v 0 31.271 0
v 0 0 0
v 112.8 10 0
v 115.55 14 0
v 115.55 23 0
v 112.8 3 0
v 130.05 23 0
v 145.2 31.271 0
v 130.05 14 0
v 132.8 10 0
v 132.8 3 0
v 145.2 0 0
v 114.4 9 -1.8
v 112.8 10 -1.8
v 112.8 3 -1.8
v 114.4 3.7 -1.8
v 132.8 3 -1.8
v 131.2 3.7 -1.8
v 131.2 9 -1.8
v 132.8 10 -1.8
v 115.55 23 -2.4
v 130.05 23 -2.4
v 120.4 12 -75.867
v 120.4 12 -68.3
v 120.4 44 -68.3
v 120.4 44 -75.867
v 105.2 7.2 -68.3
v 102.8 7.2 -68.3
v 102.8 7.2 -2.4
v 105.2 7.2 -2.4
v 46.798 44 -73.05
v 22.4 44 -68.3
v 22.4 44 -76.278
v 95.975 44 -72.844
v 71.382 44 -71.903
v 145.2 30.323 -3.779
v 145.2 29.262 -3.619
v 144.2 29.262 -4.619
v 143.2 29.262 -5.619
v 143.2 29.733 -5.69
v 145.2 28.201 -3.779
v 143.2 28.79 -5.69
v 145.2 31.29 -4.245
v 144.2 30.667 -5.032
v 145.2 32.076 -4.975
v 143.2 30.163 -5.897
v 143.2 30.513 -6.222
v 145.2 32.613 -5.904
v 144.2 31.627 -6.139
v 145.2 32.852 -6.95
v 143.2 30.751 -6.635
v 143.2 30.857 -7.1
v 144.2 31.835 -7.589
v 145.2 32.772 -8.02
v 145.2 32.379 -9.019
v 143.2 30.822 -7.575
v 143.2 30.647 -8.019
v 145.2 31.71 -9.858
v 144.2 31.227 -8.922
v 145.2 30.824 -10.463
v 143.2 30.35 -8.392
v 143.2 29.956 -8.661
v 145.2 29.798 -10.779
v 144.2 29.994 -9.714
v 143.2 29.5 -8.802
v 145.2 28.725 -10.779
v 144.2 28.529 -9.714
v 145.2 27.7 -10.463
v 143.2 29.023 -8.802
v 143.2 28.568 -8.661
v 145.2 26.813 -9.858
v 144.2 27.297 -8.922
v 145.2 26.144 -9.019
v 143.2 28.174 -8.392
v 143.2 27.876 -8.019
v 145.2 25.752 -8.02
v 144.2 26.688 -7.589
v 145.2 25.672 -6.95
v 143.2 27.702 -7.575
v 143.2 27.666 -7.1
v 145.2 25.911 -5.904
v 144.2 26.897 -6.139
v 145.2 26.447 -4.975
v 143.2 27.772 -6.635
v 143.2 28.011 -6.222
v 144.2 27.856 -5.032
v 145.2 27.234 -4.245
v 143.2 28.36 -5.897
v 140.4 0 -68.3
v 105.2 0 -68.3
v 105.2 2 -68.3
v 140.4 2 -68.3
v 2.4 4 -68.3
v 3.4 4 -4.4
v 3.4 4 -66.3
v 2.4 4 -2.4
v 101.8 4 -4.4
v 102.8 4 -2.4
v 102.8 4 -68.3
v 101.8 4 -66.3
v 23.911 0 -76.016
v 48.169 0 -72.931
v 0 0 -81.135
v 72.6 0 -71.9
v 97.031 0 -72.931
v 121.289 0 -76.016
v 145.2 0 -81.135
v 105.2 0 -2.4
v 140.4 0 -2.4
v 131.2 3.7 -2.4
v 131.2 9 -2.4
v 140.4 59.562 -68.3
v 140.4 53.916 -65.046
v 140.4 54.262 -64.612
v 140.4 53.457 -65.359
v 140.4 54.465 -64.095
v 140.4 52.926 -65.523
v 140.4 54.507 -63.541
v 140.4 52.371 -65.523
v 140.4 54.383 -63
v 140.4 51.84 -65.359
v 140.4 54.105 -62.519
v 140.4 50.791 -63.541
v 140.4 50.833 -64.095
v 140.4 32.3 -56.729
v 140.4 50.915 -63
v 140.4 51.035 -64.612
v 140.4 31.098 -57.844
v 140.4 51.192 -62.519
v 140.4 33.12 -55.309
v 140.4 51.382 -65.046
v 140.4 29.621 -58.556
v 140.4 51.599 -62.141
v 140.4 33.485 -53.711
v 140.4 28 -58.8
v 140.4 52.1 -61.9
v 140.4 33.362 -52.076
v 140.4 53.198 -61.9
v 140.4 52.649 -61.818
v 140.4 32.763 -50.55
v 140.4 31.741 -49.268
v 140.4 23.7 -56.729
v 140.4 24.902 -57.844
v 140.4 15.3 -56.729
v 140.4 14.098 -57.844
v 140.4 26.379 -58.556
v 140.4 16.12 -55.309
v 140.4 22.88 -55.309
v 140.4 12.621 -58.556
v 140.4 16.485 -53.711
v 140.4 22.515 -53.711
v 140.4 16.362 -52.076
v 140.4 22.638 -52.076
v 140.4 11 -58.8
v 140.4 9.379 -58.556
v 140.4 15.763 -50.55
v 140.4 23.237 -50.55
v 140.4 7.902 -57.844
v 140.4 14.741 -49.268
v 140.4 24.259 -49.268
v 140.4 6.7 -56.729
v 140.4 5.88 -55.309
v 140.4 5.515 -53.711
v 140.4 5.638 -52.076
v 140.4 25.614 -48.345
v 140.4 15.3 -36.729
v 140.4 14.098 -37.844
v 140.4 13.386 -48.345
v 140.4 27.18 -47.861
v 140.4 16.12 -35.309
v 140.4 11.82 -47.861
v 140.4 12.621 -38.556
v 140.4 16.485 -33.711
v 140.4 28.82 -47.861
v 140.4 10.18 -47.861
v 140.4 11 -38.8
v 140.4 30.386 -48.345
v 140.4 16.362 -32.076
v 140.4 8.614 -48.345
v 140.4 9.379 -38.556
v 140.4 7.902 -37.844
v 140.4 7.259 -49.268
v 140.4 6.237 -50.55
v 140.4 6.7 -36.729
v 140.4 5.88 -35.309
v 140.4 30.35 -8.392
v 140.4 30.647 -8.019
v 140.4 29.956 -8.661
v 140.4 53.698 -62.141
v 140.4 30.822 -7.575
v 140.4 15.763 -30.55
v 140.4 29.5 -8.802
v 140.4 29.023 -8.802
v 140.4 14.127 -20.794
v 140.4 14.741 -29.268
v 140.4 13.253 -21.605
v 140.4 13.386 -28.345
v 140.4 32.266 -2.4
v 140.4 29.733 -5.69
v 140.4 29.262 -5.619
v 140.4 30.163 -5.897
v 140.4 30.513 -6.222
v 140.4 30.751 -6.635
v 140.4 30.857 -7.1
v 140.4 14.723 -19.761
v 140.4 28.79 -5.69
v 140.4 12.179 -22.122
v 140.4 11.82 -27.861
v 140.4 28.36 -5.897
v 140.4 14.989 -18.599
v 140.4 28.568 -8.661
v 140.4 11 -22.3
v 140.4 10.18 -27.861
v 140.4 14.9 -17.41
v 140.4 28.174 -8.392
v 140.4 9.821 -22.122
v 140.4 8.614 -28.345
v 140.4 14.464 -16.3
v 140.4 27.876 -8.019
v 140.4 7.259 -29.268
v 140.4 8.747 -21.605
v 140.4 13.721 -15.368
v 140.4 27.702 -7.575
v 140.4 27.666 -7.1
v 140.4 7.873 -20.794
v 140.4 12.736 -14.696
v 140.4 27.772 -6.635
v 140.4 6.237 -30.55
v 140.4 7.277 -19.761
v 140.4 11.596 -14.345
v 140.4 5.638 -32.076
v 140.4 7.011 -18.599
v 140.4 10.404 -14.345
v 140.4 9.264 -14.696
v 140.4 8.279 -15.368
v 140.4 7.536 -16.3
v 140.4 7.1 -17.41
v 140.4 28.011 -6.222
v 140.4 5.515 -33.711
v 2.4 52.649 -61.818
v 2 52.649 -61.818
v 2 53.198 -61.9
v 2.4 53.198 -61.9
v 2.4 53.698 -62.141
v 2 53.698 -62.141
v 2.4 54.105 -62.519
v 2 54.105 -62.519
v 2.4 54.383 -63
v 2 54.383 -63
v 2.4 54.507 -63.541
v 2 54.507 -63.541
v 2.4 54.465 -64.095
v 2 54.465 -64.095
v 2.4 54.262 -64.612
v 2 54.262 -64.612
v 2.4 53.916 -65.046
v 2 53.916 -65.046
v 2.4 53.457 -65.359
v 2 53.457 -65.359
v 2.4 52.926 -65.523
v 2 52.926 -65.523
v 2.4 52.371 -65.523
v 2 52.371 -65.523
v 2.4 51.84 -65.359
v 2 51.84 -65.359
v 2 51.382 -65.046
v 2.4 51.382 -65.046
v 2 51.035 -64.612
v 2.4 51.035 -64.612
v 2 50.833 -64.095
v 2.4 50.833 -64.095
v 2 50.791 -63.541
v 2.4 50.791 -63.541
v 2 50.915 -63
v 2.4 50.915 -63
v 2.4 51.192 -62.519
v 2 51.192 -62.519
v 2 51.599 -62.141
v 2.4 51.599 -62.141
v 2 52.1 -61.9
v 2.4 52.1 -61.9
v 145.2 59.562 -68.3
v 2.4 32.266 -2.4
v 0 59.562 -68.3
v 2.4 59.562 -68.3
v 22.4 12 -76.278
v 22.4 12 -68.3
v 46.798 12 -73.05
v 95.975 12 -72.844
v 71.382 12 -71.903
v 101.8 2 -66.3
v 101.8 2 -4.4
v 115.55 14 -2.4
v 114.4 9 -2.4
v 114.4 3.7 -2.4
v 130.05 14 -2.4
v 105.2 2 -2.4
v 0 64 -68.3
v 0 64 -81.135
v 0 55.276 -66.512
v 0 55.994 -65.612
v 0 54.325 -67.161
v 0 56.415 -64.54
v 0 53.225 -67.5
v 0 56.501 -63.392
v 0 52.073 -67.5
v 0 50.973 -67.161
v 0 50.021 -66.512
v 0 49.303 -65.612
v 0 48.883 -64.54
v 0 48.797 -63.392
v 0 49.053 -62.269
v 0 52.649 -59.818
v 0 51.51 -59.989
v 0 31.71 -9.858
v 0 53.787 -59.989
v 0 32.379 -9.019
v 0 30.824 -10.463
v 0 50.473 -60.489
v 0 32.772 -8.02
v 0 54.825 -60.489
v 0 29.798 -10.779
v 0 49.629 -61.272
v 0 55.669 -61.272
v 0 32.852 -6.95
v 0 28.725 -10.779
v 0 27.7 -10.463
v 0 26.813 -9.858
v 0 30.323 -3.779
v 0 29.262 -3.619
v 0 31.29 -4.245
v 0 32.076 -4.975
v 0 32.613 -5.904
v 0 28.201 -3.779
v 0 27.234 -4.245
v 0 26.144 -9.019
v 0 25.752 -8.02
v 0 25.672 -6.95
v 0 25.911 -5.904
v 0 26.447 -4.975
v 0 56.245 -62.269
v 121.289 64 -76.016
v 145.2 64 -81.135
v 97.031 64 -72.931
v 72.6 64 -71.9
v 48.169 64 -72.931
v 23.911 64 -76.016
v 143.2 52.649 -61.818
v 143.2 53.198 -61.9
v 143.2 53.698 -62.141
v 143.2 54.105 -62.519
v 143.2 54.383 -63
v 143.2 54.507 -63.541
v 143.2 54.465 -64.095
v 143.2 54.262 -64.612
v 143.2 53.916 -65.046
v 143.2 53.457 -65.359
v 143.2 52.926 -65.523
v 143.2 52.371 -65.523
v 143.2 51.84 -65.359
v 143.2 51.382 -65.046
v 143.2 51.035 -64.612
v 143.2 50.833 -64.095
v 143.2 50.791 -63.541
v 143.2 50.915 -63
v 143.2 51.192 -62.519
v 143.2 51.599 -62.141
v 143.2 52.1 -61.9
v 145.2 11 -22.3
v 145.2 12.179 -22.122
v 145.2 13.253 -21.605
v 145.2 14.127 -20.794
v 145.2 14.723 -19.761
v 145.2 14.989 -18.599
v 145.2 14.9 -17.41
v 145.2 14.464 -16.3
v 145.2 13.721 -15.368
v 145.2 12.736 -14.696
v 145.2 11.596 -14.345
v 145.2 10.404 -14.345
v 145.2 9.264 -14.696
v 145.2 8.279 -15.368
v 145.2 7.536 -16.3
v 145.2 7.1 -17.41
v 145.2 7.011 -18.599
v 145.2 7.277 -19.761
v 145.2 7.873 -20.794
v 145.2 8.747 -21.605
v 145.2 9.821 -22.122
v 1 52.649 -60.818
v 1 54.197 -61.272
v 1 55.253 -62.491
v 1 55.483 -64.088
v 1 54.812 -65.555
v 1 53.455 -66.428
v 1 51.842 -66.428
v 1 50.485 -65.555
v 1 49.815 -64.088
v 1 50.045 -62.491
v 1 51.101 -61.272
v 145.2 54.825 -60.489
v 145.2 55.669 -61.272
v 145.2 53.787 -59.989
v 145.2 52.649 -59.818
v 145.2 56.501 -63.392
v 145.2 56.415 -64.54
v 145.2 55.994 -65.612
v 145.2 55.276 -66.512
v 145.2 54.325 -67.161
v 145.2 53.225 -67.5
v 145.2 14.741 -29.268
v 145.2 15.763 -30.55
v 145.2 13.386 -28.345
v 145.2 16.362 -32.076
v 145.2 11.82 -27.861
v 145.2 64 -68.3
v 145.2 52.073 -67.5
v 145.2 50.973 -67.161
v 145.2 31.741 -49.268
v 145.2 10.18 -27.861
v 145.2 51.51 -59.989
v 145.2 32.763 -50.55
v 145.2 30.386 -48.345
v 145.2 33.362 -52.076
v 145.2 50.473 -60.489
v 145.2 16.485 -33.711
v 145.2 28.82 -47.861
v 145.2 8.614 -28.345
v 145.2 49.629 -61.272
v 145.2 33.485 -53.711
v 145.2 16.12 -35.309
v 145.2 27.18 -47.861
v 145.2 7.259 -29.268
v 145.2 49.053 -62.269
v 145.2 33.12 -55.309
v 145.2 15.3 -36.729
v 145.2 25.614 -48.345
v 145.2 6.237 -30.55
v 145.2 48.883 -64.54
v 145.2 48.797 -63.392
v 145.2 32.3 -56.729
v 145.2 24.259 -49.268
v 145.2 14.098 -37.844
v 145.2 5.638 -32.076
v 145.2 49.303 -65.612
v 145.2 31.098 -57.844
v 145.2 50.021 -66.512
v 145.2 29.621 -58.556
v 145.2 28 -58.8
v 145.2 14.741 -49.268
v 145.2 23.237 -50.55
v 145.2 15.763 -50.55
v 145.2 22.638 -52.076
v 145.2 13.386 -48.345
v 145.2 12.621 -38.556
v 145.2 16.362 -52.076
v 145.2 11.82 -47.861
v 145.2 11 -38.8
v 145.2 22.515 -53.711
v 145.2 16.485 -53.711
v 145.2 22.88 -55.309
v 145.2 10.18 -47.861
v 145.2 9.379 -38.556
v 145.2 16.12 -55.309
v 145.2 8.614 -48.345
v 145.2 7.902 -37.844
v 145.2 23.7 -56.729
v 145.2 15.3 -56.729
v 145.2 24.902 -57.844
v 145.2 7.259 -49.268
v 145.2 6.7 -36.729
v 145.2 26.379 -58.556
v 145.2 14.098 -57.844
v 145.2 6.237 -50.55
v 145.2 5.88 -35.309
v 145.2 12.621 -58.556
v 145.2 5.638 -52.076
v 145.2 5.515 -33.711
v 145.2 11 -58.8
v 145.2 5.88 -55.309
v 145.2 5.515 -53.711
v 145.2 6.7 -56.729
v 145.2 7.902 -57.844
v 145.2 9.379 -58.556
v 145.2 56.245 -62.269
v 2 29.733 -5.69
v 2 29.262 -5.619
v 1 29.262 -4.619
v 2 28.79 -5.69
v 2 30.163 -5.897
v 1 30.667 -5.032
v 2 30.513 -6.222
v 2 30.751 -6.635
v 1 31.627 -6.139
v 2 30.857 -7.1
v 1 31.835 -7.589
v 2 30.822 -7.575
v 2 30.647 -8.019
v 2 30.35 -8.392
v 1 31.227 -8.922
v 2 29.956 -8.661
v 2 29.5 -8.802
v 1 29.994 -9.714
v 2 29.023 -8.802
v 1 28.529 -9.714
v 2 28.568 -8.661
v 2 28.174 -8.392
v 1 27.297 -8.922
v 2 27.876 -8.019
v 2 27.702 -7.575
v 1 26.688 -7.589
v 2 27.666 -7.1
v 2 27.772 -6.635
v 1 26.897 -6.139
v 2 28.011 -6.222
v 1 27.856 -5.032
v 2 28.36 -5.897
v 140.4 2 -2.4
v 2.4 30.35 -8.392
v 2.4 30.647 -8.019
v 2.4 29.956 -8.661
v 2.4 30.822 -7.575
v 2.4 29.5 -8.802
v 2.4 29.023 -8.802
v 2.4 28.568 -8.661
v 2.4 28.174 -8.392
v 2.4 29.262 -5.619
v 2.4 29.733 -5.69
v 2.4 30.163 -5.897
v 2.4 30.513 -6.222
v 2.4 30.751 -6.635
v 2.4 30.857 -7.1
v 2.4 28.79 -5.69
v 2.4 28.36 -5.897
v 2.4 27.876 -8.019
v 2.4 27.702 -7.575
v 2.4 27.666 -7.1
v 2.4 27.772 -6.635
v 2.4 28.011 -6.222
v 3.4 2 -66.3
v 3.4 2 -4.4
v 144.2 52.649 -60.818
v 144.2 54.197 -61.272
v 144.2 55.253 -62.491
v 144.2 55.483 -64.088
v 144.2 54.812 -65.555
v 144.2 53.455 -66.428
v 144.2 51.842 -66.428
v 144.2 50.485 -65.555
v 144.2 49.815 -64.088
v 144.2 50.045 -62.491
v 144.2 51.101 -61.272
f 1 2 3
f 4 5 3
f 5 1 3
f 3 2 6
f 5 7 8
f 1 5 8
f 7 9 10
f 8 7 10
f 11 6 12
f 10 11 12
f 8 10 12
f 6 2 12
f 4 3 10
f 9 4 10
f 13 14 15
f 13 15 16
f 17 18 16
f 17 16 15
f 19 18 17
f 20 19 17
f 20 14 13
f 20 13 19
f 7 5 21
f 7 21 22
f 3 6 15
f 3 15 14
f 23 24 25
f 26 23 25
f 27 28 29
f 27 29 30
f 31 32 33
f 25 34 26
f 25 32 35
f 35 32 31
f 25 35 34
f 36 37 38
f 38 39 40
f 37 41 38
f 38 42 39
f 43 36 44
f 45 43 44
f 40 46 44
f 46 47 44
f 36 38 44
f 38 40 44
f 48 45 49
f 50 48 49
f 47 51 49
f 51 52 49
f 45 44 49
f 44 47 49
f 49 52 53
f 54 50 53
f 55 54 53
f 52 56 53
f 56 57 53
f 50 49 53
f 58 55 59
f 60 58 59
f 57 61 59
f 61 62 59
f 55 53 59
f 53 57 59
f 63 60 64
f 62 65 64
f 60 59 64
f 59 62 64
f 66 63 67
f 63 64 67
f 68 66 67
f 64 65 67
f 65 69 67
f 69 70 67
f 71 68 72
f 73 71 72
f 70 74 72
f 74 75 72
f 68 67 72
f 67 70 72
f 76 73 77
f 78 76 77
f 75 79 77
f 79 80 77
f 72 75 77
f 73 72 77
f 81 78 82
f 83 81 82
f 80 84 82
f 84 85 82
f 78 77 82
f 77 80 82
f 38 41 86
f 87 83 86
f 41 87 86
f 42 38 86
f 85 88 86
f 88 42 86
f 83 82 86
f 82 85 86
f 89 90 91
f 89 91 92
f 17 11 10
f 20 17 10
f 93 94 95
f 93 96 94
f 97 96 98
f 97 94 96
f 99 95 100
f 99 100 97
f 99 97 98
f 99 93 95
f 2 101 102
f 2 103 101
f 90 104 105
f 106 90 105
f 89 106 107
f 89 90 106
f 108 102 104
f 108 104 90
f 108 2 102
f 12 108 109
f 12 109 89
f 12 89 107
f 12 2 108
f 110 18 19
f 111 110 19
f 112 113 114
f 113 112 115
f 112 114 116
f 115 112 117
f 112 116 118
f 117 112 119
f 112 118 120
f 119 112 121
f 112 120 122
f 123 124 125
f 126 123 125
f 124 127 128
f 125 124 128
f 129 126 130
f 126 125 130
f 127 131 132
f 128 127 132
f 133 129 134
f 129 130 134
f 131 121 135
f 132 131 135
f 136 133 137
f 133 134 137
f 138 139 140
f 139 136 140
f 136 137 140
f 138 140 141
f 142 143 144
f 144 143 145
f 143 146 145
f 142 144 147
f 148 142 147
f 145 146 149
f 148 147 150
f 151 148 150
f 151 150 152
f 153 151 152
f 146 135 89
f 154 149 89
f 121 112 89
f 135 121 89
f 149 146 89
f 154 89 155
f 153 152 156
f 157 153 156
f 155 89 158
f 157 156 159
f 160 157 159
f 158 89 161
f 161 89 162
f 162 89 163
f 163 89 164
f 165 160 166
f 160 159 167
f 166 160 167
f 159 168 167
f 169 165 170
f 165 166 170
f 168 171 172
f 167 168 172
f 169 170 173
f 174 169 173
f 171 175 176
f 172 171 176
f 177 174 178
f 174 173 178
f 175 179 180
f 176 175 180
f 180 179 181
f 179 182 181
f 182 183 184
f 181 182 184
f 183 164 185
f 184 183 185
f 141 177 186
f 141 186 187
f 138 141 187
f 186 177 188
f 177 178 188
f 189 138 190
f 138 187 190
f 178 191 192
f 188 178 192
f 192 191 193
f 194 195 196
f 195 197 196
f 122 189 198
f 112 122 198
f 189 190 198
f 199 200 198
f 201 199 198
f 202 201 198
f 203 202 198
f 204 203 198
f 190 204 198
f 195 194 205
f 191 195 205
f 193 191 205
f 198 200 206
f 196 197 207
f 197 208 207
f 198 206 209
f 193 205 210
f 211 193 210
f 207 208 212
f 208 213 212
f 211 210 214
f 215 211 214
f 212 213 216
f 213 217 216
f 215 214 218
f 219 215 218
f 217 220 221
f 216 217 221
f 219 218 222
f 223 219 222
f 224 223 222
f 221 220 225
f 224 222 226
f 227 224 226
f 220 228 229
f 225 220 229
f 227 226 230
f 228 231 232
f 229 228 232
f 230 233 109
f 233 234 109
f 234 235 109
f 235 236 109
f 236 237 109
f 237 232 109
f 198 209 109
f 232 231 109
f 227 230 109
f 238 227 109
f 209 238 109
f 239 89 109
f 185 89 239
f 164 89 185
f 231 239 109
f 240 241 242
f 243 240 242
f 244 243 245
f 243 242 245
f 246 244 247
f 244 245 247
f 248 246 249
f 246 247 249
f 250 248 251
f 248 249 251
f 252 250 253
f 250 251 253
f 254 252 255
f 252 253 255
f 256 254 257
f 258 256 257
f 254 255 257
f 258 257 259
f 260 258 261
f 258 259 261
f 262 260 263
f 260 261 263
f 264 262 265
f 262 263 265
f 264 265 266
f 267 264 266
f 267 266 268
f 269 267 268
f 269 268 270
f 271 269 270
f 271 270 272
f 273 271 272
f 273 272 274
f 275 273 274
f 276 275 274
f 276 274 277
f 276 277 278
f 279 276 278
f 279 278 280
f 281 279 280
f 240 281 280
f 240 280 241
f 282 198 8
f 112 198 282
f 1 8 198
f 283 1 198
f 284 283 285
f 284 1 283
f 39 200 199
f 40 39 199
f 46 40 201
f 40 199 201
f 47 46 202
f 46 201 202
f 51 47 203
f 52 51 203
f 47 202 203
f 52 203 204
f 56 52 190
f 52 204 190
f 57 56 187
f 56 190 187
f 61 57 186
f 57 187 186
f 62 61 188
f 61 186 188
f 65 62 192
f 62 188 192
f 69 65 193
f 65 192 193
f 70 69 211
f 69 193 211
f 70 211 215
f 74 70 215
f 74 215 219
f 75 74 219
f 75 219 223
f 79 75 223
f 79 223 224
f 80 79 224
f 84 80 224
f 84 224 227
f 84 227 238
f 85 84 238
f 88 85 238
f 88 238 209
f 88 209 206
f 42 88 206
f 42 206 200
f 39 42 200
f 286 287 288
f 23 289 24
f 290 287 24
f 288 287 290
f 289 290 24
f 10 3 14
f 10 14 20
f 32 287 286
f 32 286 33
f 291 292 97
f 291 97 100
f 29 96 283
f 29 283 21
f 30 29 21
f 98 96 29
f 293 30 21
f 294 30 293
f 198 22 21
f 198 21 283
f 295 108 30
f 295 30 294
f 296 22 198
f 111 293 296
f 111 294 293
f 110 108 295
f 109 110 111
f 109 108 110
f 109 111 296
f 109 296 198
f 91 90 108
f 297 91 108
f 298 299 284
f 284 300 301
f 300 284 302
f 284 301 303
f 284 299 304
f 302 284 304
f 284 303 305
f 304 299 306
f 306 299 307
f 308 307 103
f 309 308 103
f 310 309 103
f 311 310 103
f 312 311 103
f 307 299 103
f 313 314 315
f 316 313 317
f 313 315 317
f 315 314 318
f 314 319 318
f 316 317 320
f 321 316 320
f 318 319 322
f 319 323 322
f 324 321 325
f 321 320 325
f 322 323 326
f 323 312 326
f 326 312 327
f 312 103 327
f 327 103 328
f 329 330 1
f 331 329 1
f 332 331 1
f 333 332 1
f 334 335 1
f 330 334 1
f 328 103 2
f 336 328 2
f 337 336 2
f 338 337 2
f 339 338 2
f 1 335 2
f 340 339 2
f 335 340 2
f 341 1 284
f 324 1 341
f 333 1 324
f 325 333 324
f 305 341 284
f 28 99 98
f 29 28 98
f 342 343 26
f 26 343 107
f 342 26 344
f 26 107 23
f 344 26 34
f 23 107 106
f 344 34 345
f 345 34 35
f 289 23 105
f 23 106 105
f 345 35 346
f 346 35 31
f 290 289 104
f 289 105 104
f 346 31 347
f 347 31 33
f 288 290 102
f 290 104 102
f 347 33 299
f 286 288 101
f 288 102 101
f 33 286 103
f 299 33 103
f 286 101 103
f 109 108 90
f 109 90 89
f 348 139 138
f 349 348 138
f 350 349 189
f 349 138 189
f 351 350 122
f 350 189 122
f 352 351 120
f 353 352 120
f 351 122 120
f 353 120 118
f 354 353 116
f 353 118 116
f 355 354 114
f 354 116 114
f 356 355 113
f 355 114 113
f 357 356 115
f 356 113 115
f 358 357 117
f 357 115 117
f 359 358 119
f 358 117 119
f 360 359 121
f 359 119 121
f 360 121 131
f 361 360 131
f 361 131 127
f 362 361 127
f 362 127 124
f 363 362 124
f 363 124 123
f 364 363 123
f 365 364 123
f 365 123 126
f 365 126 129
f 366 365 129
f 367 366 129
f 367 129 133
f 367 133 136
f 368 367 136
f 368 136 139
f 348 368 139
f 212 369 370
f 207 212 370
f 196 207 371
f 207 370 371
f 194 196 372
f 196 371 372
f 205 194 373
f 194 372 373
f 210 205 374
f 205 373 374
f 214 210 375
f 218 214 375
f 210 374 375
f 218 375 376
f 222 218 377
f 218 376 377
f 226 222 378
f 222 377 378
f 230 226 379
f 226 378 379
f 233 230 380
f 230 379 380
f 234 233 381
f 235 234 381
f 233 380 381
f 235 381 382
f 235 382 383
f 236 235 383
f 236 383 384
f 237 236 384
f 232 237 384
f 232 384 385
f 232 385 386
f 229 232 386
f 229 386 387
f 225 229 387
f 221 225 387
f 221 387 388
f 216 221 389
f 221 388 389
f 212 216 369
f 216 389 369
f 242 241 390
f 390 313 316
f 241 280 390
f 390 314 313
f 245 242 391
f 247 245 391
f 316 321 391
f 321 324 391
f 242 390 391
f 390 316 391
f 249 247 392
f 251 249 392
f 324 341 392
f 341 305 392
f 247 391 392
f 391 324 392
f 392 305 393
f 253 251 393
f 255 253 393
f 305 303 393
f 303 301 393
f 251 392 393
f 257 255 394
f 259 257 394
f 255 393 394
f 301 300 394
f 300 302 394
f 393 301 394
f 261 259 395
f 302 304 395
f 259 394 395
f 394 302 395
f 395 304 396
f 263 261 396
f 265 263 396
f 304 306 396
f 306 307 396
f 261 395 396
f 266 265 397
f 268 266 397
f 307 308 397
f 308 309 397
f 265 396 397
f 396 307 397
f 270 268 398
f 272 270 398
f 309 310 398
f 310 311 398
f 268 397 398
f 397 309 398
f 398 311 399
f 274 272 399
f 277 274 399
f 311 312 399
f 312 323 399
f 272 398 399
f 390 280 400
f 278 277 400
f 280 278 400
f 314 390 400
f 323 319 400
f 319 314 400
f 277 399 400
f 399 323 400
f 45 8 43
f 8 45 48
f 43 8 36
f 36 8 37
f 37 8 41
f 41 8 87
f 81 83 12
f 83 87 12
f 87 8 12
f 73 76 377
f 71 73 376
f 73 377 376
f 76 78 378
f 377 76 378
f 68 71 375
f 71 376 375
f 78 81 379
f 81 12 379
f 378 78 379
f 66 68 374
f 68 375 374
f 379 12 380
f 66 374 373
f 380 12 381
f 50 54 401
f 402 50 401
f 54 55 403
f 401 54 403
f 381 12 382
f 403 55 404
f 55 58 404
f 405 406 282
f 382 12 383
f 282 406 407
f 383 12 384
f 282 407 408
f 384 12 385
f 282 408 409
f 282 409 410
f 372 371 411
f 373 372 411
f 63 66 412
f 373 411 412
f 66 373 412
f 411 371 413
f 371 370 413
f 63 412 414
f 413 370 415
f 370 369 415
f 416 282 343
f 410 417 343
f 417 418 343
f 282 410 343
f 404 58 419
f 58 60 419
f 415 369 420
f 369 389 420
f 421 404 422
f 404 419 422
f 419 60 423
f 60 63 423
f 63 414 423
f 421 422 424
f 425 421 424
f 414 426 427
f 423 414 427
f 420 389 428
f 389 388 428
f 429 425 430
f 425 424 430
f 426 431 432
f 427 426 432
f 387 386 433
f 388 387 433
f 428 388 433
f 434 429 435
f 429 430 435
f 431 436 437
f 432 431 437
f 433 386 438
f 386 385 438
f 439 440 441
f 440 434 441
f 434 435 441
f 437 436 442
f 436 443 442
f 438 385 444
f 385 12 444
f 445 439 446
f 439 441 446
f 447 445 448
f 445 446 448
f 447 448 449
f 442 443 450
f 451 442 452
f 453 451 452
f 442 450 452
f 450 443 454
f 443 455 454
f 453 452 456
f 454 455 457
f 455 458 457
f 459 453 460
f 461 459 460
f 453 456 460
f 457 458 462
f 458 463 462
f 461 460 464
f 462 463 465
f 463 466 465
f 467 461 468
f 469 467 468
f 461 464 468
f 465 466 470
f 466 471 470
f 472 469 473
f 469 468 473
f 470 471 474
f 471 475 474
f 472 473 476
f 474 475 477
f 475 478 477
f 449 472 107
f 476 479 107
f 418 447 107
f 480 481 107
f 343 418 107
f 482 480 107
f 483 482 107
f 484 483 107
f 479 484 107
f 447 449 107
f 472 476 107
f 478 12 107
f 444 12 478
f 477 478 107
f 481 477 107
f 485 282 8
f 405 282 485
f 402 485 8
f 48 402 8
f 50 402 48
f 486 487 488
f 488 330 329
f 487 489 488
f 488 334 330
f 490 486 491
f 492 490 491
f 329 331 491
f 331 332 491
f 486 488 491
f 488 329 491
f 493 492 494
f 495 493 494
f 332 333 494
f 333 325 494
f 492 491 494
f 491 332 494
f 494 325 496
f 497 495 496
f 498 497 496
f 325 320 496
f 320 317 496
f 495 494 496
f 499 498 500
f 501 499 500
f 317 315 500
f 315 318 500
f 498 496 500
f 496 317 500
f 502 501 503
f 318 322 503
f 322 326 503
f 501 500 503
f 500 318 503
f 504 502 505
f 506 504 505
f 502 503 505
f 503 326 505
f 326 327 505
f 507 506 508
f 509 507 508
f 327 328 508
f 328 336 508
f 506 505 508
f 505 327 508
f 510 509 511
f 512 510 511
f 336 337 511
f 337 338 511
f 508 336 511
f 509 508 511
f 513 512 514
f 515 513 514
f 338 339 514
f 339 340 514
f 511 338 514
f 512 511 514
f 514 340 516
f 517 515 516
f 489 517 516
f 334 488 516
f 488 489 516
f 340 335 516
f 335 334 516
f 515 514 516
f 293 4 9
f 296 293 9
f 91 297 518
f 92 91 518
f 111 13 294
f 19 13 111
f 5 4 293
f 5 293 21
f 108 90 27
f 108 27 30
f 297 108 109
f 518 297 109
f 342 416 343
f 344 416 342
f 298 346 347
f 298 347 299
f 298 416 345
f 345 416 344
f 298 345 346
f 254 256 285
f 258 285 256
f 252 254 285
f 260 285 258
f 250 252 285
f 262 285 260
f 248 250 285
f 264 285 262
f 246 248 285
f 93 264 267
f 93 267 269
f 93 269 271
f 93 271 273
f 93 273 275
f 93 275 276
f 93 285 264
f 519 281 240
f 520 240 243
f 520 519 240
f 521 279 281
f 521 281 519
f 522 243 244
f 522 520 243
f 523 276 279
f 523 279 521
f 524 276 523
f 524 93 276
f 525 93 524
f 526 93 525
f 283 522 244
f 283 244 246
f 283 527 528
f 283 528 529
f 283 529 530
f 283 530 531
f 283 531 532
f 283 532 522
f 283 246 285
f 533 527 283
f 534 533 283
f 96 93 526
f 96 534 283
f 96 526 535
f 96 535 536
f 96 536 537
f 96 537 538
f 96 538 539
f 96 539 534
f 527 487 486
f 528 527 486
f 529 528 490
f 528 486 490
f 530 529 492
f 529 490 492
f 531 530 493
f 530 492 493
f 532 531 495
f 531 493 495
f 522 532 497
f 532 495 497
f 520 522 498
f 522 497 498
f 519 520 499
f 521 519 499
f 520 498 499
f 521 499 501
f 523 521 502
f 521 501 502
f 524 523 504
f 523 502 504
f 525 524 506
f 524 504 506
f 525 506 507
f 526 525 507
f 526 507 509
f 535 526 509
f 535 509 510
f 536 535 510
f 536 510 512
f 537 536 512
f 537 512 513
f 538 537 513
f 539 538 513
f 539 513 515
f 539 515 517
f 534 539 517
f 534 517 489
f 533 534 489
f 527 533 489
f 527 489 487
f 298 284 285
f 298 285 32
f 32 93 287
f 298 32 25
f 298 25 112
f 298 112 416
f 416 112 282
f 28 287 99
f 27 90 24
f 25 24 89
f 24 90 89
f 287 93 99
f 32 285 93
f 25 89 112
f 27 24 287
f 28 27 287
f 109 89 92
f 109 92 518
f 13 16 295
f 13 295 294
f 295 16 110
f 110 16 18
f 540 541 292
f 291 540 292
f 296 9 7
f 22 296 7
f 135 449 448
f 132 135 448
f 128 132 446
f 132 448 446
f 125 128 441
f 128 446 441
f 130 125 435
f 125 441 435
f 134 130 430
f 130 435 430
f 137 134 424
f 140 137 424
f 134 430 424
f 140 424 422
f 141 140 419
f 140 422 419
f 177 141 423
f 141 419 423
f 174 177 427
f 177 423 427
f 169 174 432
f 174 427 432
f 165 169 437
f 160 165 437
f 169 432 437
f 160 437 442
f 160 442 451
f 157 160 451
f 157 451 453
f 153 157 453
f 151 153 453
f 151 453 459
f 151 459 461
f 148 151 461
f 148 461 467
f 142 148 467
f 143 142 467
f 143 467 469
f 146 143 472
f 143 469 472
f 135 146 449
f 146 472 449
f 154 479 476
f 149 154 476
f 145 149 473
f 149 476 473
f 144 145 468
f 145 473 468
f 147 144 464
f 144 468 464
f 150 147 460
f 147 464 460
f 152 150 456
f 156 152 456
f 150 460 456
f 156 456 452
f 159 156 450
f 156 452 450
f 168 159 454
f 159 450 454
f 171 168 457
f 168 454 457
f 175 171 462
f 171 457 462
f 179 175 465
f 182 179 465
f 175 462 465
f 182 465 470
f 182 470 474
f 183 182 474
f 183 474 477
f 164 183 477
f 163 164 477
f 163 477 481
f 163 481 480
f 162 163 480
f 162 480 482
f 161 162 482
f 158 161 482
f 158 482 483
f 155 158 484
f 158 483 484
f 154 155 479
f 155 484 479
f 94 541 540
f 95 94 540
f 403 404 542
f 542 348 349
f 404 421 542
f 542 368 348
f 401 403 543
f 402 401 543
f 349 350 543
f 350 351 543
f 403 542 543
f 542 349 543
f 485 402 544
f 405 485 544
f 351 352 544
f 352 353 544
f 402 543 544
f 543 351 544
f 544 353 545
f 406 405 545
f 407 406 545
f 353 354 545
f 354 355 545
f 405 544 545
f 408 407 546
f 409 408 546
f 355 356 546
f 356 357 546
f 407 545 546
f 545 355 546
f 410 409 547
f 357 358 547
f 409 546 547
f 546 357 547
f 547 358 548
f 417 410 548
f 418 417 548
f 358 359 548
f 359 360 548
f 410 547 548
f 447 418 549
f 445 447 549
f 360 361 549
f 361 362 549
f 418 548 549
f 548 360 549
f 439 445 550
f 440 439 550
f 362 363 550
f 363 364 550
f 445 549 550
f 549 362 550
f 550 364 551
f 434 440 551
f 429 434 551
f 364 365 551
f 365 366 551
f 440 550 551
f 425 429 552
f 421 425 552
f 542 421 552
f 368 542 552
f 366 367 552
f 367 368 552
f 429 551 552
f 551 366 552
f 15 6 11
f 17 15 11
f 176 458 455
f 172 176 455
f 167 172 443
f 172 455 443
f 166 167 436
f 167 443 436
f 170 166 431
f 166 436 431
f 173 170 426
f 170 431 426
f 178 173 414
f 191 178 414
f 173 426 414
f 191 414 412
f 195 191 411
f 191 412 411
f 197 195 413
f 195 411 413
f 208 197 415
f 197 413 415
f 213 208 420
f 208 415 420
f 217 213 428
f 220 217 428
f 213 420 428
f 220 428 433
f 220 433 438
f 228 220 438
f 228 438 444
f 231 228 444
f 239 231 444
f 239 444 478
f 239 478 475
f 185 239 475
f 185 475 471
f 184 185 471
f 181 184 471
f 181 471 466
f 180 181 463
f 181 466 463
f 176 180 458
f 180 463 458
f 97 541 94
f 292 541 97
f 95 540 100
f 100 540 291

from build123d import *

# Parameters (mm, degrees)
SKIZZE1_W                         = 145.2
SKIZZE1_H                         = 70.7
AUFSATZ_LINEAR_AUSTRAGEN1_DEPTH   = 64
AUFSATZ_LINEAR_AUSTRAGEN2_DEPTH   = 64
SKIZZE4_W                         = 100.4
SKIZZE4_H                         = 65.9
SKIZZE4_W_2                       = 35.2
SCHNITT_LINEAR_AUSTRAGEN3_DEPTH   = 179.21855852
SKIZZE5_W                         = 100.4
SKIZZE5_H                         = 65.9
AUFSATZ_LINEAR_AUSTRAGEN3_DEPTH   = 2
SKIZZE5_W_2                       = 35.2
AUFSATZ_LINEAR_AUSTRAGEN3_2_DEPTH = 2
SKIZZE6_W                         = 100.4
SKIZZE6_H                         = 65.9
SKIZZE6_W_2                       = 98.4
SKIZZE6_H_2                       = 61.9
AUFSATZ_LINEAR_AUSTRAGEN4_DEPTH   = 2
SKIZZE8_W                         = 2.4
SKIZZE8_H                         = 65.9
SCHNITT_LINEAR_AUSTRAGEN4_DEPTH   = 56.8
SCHNITT_LINEAR_AUSTRAGEN5_DEPTH   = 179.21855852
SCHNITT_LINEAR_AUSTRAGEN6_DEPTH   = 179.21855852
SKIZZE11_W                        = 98
SKIZZE11_H                        = 32
SCHNITT_LINEAR_AUSTRAGEN7_DEPTH   = 173.753957986
SKIZZE12_R                        = 1.862936884
SKIZZE12_R_2                      = 1.6
SCHNITT_LINEAR_AUSTRAGEN8_DEPTH   = 179.21855852
FASE1_SIZE                        = 2
SKIZZE13_R                        = 5.5
SKIZZE13_R_2                      = 4
SCHNITT_LINEAR_AUSTRAGEN9_DEPTH   = 4.8
SKIZZE14_W                        = 20
SKIZZE14_H                        = 7
SCHNITT_LINEAR_AUSTRAGEN10_DEPTH  = 1.8
SKIZZE15_W                        = 16.8
SKIZZE15_H                        = 5.3
SCHNITT_LINEAR_AUSTRAGEN11_DEPTH  = 0.6
SKIZZE16_W                        = 14.5
SKIZZE16_H                        = 9
SCHNITT_LINEAR_AUSTRAGEN12_DEPTH  = 2.4


with BuildPart() as part:
    # Skizze1 → Aufsatz-Linear austragen1 (new body)
    with BuildSketch(Plane(origin=(0, 0, 0), x_dir=(1, 0, 0), z_dir=(0, 1, 0))):
        with Locations((72.6, 35.35)):
            Rectangle(SKIZZE1_W, SKIZZE1_H)
    extrude(amount=AUFSATZ_LINEAR_AUSTRAGEN1_DEPTH)

    # Skizze3 → Aufsatz-Linear austragen2 (add)
    with BuildSketch(Plane.XZ):
        with BuildLine():
            Line((0, -70.7), (145.2, -70.7))
            Line((145.2, -70.7), (145.2, -81.134546285))
            ThreePointArc((145.2, -81.134546285), (72.6, -71.9), (0, -81.134546285))
            Line((0, -81.134546285), (0, -70.7))
        make_face()
    extrude(amount=-AUFSATZ_LINEAR_AUSTRAGEN2_DEPTH)

    # Skizze4 → Schnitt-Linear austragen3 (cut, through all)
    with BuildSketch(Plane.XZ):
        with Locations((52.6, -35.35)):
            Rectangle(SKIZZE4_W, SKIZZE4_H)
        with Locations((122.8, -35.35)):
            Rectangle(SKIZZE4_W_2, SKIZZE4_H)
    extrude(amount=-SCHNITT_LINEAR_AUSTRAGEN3_DEPTH, mode=Mode.SUBTRACT)



with BuildPart() as body_2:
    # Skizze5 → Aufsatz-Linear austragen3 (new body)
    with BuildSketch(Plane.XZ):
        with Locations((52.6, -35.35)):
            Rectangle(SKIZZE5_W, SKIZZE5_H)
    extrude(amount=-AUFSATZ_LINEAR_AUSTRAGEN3_DEPTH)


with BuildPart() as body_3:
    # Skizze5 → Aufsatz-Linear austragen3 2 (new body)
    with BuildSketch(Plane.XZ):
        with Locations((122.8, -35.35)):
            Rectangle(SKIZZE5_W_2, SKIZZE5_H)
    extrude(amount=-AUFSATZ_LINEAR_AUSTRAGEN3_2_DEPTH)


with BuildPart() as part_1:
    add(part.part)

    add(body_2.part)  # Aufsatz-Linear austragen4 merges body 2
    # Skizze6 → Aufsatz-Linear austragen4 (add)
    with BuildSketch(Plane(origin=(0, 2, 0), x_dir=(1, 0, 0), z_dir=(0, 1, 0))):
        with Locations((52.6, 35.35)):
            Rectangle(SKIZZE6_W, SKIZZE6_H)
        with Locations((52.6, 35.35)):
            Rectangle(SKIZZE6_W_2, SKIZZE6_H_2, mode=Mode.SUBTRACT)
    extrude(amount=AUFSATZ_LINEAR_AUSTRAGEN4_DEPTH)

    # Skizze8 → Schnitt-Linear austragen4 (cut)
    with BuildSketch(Plane(origin=(0, 64, 0), x_dir=(1, 0, 0), z_dir=(0, 1, 0))):
        with Locations((104, 35.35)):
            Rectangle(SKIZZE8_W, SKIZZE8_H)
    extrude(amount=-SCHNITT_LINEAR_AUSTRAGEN4_DEPTH, mode=Mode.SUBTRACT)

    # Skizze9 → Schnitt-Linear austragen5 (cut, through all)
    with BuildSketch(Plane.ZY):
        Polygon((-68.3, 64), (0, 64), (0, 35.70921369), align=None)
    extrude(amount=-SCHNITT_LINEAR_AUSTRAGEN5_DEPTH, mode=Mode.SUBTRACT)

    # Skizze10 → Schnitt-Linear austragen6 (cut, through all)
    with BuildSketch(Plane.ZY):
        Polygon((-68.3, 64), (0, 35.70921369), (0, 31.271405669), (-68.3, 59.562191979), align=None)
    extrude(amount=-SCHNITT_LINEAR_AUSTRAGEN6_DEPTH, mode=Mode.SUBTRACT)

    # Skizze11 → Schnitt-Linear austragen7 (cut, through all)
    with BuildSketch(Plane.XY.offset(-68.3)):
        with Locations((71.4, 28)):
            Rectangle(SKIZZE11_W, SKIZZE11_H)
    extrude(amount=-SCHNITT_LINEAR_AUSTRAGEN7_DEPTH, mode=Mode.SUBTRACT)

    # Skizze12 → Schnitt-Linear austragen8 (cut, through all)
    with BuildSketch(Plane.ZY):
        with Locations((-63.680602337, 52.648774817)):
            Circle(SKIZZE12_R)
        with Locations((-7.219397663, 29.261778093)):
            Circle(SKIZZE12_R_2)
    extrude(amount=-SCHNITT_LINEAR_AUSTRAGEN8_DEPTH, mode=Mode.SUBTRACT)

    # Fase1
    fase1_edges = [part_1.edges().sort_by_distance(p)[0] for p in [
        (145.2, 52.648774817, -65.543539222),
        (0, 52.648774817, -65.543539222),
        (145.2, 29.261778093, -8.819397663),
        (0, 29.261778093, -8.819397663),
    ]]
    chamfer(fase1_edges, length=FASE1_SIZE)

    # Skizze13 → Schnitt-Linear austragen9 (cut)
    with BuildSketch(Plane(origin=(145.2, 0, 0), x_dir=(0, 0, -1), z_dir=(1, 0, 0))):
        with Locations((53.3, 11)):
            Circle(SKIZZE13_R)
        with Locations((53.3, 28)):
            Circle(SKIZZE13_R)
        with Locations((33.3, 11)):
            Circle(SKIZZE13_R)
        with Locations((18.3, 11)):
            Circle(SKIZZE13_R_2)
    extrude(amount=-SCHNITT_LINEAR_AUSTRAGEN9_DEPTH, mode=Mode.SUBTRACT)

    # Skizze14 → Schnitt-Linear austragen10 (cut)
    with BuildSketch(Plane.XY):
        with Locations((122.8, 6.5)):
            Rectangle(SKIZZE14_W, SKIZZE14_H)
    extrude(amount=-SCHNITT_LINEAR_AUSTRAGEN10_DEPTH, mode=Mode.SUBTRACT)

    # Skizze15 → Schnitt-Linear austragen11 (cut)
    with BuildSketch(Plane.XY.offset(-1.8)):
        with Locations((122.8, 6.35)):
            Rectangle(SKIZZE15_W, SKIZZE15_H)
    extrude(amount=-SCHNITT_LINEAR_AUSTRAGEN11_DEPTH, mode=Mode.SUBTRACT)

    # Skizze16 → Schnitt-Linear austragen12 (cut)
    with BuildSketch(Plane.XY):
        with Locations((122.8, 18.5)):
            Rectangle(SKIZZE16_W, SKIZZE16_H)
    extrude(amount=-SCHNITT_LINEAR_AUSTRAGEN12_DEPTH, mode=Mode.SUBTRACT)


solid = Compound([body_3.part, part_1.part])
